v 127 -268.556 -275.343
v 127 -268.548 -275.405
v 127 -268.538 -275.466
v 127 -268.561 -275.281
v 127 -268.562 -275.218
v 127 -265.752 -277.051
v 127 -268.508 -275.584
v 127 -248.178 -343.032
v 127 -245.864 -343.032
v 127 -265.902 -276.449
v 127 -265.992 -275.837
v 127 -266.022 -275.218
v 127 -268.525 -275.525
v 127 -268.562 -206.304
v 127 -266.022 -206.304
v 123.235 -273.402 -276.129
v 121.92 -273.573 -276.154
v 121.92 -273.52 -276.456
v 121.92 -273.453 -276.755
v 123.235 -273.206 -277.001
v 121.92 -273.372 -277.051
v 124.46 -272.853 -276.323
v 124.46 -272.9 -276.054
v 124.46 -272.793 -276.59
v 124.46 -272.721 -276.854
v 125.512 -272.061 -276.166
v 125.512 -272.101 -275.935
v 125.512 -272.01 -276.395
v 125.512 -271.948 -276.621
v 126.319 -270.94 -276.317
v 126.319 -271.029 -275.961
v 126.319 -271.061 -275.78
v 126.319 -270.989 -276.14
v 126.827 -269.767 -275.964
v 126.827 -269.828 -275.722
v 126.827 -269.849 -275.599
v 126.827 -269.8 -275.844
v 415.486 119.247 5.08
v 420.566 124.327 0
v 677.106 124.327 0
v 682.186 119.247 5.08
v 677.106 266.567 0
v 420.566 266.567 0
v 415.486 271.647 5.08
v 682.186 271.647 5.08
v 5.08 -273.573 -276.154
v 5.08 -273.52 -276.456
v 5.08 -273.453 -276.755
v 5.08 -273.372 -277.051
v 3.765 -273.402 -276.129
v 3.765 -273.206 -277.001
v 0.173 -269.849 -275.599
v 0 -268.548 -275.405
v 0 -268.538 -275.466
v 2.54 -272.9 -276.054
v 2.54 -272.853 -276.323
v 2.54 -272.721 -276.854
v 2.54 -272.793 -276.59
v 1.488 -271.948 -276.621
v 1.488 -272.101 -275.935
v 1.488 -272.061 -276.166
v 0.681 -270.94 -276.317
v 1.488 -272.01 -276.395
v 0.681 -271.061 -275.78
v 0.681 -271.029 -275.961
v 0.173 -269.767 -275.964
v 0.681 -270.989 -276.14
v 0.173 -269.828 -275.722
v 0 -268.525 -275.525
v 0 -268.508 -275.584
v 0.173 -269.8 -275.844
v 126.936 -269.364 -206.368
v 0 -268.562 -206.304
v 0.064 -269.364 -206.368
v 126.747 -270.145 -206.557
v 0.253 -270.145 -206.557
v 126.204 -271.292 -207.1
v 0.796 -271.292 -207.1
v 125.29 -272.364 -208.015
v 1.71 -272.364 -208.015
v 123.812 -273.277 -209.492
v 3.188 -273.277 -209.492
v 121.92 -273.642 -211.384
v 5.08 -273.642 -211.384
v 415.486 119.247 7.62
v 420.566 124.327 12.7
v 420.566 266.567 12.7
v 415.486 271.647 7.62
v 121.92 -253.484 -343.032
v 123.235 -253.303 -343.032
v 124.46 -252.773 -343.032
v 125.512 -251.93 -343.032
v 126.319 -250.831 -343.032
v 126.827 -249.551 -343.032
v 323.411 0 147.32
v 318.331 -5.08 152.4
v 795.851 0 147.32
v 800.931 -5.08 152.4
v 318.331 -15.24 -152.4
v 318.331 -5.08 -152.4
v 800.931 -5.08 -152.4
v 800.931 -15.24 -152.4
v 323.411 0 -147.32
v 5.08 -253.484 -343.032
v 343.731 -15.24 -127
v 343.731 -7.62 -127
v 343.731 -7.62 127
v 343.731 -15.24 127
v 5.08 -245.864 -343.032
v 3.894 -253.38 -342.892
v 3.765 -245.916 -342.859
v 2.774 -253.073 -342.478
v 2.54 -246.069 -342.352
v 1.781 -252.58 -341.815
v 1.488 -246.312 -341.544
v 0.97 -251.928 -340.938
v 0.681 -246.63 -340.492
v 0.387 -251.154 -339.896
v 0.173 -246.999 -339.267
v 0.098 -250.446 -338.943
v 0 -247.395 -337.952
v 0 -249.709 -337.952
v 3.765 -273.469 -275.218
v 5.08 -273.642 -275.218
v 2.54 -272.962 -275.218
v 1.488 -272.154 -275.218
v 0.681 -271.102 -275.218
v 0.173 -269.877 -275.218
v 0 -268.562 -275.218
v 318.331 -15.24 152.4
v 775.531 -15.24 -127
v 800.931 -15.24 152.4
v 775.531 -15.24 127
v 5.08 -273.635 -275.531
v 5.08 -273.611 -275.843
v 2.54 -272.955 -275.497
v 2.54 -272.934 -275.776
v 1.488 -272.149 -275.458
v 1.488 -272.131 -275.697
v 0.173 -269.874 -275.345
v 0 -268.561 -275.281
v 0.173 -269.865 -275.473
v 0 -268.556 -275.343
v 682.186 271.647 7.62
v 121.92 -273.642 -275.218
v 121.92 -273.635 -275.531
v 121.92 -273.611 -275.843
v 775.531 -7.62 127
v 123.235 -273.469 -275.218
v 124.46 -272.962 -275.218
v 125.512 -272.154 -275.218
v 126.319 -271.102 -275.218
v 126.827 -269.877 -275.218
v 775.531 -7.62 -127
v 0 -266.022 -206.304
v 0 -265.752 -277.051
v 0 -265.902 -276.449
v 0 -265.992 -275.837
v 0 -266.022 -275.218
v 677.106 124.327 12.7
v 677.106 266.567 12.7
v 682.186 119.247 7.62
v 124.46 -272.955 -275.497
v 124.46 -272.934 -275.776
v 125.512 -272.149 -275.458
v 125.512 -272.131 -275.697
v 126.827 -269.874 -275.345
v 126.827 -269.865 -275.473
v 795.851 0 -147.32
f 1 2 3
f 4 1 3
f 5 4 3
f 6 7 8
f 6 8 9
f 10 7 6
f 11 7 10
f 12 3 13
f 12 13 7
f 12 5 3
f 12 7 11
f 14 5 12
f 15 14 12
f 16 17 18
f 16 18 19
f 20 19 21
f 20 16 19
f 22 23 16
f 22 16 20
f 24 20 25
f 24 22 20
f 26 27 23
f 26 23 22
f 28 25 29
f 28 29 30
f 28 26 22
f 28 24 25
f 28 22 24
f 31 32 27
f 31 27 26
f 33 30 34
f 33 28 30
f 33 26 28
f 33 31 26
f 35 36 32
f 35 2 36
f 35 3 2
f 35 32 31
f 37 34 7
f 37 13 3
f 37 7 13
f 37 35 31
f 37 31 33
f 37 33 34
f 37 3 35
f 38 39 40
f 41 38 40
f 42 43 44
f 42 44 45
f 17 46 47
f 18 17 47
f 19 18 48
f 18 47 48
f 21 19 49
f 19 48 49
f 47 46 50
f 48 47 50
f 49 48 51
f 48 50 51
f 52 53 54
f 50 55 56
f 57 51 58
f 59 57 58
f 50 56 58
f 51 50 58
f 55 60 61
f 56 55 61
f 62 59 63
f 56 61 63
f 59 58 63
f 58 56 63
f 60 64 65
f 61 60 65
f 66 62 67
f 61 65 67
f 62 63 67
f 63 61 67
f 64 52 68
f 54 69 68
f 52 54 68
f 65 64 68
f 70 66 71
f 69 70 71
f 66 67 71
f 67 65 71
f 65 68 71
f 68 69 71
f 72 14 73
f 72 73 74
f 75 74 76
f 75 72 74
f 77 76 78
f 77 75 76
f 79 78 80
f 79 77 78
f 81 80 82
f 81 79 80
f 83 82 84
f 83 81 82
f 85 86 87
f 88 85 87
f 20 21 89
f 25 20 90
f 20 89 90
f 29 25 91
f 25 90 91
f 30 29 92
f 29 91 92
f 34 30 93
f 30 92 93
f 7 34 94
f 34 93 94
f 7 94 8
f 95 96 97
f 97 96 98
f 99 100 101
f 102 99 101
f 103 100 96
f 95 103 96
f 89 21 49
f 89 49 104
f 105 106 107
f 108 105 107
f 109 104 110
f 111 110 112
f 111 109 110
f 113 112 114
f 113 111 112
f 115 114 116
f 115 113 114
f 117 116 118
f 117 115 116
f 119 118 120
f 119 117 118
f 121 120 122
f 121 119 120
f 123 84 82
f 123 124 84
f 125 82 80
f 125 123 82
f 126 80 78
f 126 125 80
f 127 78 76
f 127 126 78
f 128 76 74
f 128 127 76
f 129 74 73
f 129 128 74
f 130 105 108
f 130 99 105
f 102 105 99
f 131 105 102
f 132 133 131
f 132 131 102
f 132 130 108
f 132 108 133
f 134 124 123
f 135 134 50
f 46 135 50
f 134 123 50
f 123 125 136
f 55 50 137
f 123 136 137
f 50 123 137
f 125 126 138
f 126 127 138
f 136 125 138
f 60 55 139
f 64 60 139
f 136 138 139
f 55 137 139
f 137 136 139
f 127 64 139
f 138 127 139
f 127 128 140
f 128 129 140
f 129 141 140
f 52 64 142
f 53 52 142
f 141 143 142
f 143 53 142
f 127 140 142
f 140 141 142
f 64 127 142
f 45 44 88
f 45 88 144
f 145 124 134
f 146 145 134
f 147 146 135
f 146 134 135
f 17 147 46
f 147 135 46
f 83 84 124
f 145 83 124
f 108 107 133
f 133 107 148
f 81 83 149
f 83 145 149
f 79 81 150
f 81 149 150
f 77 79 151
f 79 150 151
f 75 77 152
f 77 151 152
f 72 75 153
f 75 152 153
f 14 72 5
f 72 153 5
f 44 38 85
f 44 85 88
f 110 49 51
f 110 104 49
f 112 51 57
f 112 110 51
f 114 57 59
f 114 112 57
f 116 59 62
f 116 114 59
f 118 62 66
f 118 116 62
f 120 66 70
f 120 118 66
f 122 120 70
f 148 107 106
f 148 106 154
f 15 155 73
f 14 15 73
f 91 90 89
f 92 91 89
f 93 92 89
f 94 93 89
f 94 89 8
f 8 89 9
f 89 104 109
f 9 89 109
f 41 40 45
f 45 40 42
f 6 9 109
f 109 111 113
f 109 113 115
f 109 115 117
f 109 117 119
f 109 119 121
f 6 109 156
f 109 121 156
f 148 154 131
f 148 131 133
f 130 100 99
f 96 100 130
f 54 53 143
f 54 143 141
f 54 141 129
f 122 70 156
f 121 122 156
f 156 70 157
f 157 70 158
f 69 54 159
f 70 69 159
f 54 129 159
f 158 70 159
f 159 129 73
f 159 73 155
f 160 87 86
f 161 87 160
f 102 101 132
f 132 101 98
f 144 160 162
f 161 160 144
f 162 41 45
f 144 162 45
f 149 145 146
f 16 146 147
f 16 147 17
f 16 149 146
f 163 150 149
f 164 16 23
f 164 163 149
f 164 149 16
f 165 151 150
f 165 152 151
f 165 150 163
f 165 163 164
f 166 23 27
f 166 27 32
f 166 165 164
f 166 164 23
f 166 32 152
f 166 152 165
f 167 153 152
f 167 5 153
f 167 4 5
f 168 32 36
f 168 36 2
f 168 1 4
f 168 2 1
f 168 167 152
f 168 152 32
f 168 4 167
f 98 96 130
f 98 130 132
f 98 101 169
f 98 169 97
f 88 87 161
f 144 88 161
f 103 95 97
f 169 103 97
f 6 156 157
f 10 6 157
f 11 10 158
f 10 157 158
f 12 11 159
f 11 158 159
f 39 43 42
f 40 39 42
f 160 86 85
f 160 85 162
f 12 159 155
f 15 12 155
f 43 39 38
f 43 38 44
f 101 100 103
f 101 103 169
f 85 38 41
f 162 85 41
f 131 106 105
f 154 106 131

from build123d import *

# Parameters (mm, degrees)
F0_W      = 482.6
F0_H      = 304.8
F0_W_2    = 431.8
F0_H_2    = 254
F1_DEPTH  = 15.24
F2_DEPTH  = 7.62
F3_W      = 266.7
F3_H      = 152.4
F4_DEPTH  = 12.7
F5_SIZE   = 5.08
F5_2_SIZE = 5.08
F7_DEPTH  = 127
F8_R      = 5.08


with BuildPart() as f1:
    # F0 (on Front) → F1 (new body)
    with BuildSketch(Plane.XZ):
        with Locations((559.631395, 0)):
            Rectangle(F0_W, F0_H)
        with Locations((559.631395, 0)):
            Rectangle(F0_W_2, F0_H_2, mode=Mode.SUBTRACT)
    extrude(amount=F1_DEPTH)

    # F0 (on Front) → F2 (join)
    with BuildSketch(Plane.XZ):
        with Locations((559.631395, 0)):
            Rectangle(F0_W_2, F0_H_2)
    extrude(amount=F2_DEPTH)

    # F5#2
    f5_2_edges = [f1.edges().sort_by_distance(p)[0] for p in [
        (318.331395, 0, 0),
        (559.631395, 0, -152.4),
        (800.931395, 0, 0),
        (559.631395, 0, 152.4),
    ]]
    chamfer(f5_2_edges, length=F5_2_SIZE)


with BuildPart() as f4:
    # F3 (on Top) → F4 (new body)
    with BuildSketch(Plane.XY):
        with Locations((548.835635, 195.44692)):
            Rectangle(F3_W, F3_H)
    extrude(amount=F4_DEPTH)

    # F5
    f5_edges = [f4.edges().sort_by_distance(p)[0] for p in [
        (548.835635, 271.64692, 0),
        (548.835635, 271.64692, 12.7),
        (415.485635, 195.44692, 0),
        (415.485635, 195.44692, 12.7),
        (682.185635, 195.44692, 0),
        (682.185635, 195.44692, 12.7),
        (548.835635, 119.24692, 12.7),
        (548.835635, 119.24692, 0),
    ]]
    chamfer(f5_edges, length=F5_SIZE)


with BuildPart() as f7:
    # F6 (on Right) → F7 (new body)
    with BuildSketch(Plane.YZ):
        with BuildLine():
            Line((-266.022326, -275.217943), (-266.022326, -206.304147))
            Line((-266.022326, -206.304147), (-273.642326, -206.304147))
            Line((-273.642326, -206.304147), (-273.642326, -275.217943))
            ThreePointArc((-273.642326, -275.217943), (-273.624954, -275.687329), (-273.572933, -276.154147))
            ThreePointArc((-273.572933, -276.154147), (-273.488767, -276.605967), (-273.372143, -277.050517))
            Line((-273.372143, -277.050517), (-253.484011, -343.032131))
            Line((-253.484011, -343.032131), (-245.864011, -343.032131))
            Line((-245.864011, -343.032131), (-265.752143, -277.050517))
            ThreePointArc((-265.752143, -277.050517), (-265.954417, -276.144135), (-266.022326, -275.217943))
        make_face()
    extrude(amount=F7_DEPTH)

    # F8
    f8_edges = [f7.edges().sort_by_distance(p)[0] for p in [
        (0, -249.674011, -343.032131),
        (0, -263.428077, -310.041324),
        (127, -273.642326, -240.761045),
        (63.5, -273.642326, -206.304147),
        (63.5, -273.642326, -275.217943),
    ]]
    fillet(f8_edges, radius=F8_R)


solid = Compound([f1.part, f4.part, f7.part])
